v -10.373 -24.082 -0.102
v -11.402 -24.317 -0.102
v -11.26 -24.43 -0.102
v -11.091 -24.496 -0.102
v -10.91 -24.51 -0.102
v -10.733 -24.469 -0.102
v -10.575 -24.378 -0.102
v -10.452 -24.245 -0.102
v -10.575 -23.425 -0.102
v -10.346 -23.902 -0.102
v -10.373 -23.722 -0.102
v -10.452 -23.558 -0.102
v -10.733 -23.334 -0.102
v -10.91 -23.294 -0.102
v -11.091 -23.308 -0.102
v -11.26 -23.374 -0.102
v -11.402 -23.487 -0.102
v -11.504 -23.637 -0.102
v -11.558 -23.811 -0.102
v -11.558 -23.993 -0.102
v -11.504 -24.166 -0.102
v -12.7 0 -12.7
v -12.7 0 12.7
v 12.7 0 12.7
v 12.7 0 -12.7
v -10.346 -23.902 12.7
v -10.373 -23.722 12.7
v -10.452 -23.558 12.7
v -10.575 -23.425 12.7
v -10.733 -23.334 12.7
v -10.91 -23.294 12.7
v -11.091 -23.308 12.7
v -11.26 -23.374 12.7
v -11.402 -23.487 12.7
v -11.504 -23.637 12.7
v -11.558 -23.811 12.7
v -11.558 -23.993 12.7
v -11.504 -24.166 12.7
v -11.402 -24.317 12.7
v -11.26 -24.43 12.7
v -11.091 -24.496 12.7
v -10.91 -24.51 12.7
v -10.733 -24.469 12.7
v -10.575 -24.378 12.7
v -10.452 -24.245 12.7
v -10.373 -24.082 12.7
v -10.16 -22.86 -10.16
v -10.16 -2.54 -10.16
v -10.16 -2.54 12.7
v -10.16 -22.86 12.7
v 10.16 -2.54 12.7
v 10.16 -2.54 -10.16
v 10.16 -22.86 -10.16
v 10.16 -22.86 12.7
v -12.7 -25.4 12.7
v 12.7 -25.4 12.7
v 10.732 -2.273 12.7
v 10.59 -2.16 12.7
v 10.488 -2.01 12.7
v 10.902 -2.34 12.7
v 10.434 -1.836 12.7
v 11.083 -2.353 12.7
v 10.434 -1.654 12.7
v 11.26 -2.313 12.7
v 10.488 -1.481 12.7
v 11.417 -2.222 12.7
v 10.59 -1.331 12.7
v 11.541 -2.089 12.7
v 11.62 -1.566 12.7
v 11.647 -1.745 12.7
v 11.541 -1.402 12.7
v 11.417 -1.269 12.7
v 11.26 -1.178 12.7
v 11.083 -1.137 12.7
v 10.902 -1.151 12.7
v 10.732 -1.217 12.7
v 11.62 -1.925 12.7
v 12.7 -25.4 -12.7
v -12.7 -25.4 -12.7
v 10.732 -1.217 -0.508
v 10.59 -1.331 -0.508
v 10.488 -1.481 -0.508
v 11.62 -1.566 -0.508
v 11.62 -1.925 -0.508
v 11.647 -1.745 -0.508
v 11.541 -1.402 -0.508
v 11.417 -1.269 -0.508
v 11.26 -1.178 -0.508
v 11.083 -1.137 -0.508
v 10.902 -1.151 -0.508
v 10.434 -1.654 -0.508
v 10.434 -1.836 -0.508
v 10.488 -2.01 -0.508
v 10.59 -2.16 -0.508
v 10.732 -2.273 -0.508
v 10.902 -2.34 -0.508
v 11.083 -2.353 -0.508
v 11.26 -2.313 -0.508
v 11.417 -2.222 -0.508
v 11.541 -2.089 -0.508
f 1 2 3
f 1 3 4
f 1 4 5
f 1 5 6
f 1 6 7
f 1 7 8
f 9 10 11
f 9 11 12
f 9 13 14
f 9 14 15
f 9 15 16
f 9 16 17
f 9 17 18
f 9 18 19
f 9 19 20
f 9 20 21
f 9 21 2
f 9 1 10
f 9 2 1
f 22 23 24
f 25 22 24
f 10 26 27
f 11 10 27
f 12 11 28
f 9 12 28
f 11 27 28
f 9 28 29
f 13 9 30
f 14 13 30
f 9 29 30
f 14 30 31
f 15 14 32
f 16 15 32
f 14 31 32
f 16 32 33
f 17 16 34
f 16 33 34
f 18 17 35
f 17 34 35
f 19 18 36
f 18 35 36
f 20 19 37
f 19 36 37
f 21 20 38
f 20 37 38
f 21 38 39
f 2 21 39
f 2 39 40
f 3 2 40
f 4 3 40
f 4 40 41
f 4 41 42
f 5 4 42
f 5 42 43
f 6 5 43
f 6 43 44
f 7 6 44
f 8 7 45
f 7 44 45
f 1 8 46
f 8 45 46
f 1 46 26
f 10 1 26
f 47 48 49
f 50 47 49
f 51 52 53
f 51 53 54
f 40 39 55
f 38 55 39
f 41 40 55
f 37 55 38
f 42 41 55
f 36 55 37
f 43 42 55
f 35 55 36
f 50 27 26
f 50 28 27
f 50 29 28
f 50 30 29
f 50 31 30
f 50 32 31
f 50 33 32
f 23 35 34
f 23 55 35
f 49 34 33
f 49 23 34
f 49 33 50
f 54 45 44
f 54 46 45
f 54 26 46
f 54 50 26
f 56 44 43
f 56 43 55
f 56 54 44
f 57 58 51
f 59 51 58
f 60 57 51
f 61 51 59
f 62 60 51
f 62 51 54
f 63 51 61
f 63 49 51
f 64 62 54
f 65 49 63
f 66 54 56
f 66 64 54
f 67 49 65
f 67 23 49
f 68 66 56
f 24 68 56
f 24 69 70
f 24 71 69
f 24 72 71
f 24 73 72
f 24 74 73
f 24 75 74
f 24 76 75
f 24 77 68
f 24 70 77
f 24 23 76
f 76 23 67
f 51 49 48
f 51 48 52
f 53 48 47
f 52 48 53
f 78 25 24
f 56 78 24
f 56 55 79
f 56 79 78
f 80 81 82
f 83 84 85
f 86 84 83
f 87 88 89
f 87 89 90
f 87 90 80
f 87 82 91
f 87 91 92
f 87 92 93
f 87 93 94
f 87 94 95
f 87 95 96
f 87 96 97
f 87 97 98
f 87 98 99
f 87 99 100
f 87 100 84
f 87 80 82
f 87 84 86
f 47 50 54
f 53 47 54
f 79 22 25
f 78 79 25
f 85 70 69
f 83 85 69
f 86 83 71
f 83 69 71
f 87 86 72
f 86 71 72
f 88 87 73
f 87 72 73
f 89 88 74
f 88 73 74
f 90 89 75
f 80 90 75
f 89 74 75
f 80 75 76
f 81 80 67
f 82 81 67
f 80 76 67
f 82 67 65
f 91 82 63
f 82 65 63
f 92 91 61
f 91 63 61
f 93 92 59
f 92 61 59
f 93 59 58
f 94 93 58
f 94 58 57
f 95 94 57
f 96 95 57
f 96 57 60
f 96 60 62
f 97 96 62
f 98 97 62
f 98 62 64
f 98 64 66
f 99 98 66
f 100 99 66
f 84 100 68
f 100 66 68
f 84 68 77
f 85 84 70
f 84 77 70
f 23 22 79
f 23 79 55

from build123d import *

# Parameters (mm, degrees)
F0_W     = 25.4
F0_H     = 25.4
F1_DEPTH = 25.4
F2_T     = -2.54
F3_R     = 0.6096
F4_DEPTH = 12.8016
F5_R     = 0.6096
F6_DEPTH = 13.208


with BuildPart() as f1:
    # F0 (on Front) → F1 (new body)
    with BuildSketch(Plane.XZ):
        Rectangle(F0_W, F0_H)
    extrude(amount=F1_DEPTH)

    # F2
    f2_openings = [f1.faces().sort_by_distance(p)[0] for p in [
        (0, -12.7, 12.7),
    ]]
    offset(amount=F2_T, openings=f2_openings)

    # F3 (on face) → F4 (cut)
    with BuildSketch(Plane.XY.offset(12.7)):
        with Locations((-10.955215, -23.901867)):
            Circle(F3_R)
    extrude(amount=-F4_DEPTH, mode=Mode.SUBTRACT)

    # F5 (on face) → F6 (cut)
    with BuildSketch(Plane.XY.offset(12.7)):
        with Locations((11.037277, -1.745251)):
            Circle(F5_R)
    extrude(amount=-F6_DEPTH, mode=Mode.SUBTRACT)


solid = f1.part
